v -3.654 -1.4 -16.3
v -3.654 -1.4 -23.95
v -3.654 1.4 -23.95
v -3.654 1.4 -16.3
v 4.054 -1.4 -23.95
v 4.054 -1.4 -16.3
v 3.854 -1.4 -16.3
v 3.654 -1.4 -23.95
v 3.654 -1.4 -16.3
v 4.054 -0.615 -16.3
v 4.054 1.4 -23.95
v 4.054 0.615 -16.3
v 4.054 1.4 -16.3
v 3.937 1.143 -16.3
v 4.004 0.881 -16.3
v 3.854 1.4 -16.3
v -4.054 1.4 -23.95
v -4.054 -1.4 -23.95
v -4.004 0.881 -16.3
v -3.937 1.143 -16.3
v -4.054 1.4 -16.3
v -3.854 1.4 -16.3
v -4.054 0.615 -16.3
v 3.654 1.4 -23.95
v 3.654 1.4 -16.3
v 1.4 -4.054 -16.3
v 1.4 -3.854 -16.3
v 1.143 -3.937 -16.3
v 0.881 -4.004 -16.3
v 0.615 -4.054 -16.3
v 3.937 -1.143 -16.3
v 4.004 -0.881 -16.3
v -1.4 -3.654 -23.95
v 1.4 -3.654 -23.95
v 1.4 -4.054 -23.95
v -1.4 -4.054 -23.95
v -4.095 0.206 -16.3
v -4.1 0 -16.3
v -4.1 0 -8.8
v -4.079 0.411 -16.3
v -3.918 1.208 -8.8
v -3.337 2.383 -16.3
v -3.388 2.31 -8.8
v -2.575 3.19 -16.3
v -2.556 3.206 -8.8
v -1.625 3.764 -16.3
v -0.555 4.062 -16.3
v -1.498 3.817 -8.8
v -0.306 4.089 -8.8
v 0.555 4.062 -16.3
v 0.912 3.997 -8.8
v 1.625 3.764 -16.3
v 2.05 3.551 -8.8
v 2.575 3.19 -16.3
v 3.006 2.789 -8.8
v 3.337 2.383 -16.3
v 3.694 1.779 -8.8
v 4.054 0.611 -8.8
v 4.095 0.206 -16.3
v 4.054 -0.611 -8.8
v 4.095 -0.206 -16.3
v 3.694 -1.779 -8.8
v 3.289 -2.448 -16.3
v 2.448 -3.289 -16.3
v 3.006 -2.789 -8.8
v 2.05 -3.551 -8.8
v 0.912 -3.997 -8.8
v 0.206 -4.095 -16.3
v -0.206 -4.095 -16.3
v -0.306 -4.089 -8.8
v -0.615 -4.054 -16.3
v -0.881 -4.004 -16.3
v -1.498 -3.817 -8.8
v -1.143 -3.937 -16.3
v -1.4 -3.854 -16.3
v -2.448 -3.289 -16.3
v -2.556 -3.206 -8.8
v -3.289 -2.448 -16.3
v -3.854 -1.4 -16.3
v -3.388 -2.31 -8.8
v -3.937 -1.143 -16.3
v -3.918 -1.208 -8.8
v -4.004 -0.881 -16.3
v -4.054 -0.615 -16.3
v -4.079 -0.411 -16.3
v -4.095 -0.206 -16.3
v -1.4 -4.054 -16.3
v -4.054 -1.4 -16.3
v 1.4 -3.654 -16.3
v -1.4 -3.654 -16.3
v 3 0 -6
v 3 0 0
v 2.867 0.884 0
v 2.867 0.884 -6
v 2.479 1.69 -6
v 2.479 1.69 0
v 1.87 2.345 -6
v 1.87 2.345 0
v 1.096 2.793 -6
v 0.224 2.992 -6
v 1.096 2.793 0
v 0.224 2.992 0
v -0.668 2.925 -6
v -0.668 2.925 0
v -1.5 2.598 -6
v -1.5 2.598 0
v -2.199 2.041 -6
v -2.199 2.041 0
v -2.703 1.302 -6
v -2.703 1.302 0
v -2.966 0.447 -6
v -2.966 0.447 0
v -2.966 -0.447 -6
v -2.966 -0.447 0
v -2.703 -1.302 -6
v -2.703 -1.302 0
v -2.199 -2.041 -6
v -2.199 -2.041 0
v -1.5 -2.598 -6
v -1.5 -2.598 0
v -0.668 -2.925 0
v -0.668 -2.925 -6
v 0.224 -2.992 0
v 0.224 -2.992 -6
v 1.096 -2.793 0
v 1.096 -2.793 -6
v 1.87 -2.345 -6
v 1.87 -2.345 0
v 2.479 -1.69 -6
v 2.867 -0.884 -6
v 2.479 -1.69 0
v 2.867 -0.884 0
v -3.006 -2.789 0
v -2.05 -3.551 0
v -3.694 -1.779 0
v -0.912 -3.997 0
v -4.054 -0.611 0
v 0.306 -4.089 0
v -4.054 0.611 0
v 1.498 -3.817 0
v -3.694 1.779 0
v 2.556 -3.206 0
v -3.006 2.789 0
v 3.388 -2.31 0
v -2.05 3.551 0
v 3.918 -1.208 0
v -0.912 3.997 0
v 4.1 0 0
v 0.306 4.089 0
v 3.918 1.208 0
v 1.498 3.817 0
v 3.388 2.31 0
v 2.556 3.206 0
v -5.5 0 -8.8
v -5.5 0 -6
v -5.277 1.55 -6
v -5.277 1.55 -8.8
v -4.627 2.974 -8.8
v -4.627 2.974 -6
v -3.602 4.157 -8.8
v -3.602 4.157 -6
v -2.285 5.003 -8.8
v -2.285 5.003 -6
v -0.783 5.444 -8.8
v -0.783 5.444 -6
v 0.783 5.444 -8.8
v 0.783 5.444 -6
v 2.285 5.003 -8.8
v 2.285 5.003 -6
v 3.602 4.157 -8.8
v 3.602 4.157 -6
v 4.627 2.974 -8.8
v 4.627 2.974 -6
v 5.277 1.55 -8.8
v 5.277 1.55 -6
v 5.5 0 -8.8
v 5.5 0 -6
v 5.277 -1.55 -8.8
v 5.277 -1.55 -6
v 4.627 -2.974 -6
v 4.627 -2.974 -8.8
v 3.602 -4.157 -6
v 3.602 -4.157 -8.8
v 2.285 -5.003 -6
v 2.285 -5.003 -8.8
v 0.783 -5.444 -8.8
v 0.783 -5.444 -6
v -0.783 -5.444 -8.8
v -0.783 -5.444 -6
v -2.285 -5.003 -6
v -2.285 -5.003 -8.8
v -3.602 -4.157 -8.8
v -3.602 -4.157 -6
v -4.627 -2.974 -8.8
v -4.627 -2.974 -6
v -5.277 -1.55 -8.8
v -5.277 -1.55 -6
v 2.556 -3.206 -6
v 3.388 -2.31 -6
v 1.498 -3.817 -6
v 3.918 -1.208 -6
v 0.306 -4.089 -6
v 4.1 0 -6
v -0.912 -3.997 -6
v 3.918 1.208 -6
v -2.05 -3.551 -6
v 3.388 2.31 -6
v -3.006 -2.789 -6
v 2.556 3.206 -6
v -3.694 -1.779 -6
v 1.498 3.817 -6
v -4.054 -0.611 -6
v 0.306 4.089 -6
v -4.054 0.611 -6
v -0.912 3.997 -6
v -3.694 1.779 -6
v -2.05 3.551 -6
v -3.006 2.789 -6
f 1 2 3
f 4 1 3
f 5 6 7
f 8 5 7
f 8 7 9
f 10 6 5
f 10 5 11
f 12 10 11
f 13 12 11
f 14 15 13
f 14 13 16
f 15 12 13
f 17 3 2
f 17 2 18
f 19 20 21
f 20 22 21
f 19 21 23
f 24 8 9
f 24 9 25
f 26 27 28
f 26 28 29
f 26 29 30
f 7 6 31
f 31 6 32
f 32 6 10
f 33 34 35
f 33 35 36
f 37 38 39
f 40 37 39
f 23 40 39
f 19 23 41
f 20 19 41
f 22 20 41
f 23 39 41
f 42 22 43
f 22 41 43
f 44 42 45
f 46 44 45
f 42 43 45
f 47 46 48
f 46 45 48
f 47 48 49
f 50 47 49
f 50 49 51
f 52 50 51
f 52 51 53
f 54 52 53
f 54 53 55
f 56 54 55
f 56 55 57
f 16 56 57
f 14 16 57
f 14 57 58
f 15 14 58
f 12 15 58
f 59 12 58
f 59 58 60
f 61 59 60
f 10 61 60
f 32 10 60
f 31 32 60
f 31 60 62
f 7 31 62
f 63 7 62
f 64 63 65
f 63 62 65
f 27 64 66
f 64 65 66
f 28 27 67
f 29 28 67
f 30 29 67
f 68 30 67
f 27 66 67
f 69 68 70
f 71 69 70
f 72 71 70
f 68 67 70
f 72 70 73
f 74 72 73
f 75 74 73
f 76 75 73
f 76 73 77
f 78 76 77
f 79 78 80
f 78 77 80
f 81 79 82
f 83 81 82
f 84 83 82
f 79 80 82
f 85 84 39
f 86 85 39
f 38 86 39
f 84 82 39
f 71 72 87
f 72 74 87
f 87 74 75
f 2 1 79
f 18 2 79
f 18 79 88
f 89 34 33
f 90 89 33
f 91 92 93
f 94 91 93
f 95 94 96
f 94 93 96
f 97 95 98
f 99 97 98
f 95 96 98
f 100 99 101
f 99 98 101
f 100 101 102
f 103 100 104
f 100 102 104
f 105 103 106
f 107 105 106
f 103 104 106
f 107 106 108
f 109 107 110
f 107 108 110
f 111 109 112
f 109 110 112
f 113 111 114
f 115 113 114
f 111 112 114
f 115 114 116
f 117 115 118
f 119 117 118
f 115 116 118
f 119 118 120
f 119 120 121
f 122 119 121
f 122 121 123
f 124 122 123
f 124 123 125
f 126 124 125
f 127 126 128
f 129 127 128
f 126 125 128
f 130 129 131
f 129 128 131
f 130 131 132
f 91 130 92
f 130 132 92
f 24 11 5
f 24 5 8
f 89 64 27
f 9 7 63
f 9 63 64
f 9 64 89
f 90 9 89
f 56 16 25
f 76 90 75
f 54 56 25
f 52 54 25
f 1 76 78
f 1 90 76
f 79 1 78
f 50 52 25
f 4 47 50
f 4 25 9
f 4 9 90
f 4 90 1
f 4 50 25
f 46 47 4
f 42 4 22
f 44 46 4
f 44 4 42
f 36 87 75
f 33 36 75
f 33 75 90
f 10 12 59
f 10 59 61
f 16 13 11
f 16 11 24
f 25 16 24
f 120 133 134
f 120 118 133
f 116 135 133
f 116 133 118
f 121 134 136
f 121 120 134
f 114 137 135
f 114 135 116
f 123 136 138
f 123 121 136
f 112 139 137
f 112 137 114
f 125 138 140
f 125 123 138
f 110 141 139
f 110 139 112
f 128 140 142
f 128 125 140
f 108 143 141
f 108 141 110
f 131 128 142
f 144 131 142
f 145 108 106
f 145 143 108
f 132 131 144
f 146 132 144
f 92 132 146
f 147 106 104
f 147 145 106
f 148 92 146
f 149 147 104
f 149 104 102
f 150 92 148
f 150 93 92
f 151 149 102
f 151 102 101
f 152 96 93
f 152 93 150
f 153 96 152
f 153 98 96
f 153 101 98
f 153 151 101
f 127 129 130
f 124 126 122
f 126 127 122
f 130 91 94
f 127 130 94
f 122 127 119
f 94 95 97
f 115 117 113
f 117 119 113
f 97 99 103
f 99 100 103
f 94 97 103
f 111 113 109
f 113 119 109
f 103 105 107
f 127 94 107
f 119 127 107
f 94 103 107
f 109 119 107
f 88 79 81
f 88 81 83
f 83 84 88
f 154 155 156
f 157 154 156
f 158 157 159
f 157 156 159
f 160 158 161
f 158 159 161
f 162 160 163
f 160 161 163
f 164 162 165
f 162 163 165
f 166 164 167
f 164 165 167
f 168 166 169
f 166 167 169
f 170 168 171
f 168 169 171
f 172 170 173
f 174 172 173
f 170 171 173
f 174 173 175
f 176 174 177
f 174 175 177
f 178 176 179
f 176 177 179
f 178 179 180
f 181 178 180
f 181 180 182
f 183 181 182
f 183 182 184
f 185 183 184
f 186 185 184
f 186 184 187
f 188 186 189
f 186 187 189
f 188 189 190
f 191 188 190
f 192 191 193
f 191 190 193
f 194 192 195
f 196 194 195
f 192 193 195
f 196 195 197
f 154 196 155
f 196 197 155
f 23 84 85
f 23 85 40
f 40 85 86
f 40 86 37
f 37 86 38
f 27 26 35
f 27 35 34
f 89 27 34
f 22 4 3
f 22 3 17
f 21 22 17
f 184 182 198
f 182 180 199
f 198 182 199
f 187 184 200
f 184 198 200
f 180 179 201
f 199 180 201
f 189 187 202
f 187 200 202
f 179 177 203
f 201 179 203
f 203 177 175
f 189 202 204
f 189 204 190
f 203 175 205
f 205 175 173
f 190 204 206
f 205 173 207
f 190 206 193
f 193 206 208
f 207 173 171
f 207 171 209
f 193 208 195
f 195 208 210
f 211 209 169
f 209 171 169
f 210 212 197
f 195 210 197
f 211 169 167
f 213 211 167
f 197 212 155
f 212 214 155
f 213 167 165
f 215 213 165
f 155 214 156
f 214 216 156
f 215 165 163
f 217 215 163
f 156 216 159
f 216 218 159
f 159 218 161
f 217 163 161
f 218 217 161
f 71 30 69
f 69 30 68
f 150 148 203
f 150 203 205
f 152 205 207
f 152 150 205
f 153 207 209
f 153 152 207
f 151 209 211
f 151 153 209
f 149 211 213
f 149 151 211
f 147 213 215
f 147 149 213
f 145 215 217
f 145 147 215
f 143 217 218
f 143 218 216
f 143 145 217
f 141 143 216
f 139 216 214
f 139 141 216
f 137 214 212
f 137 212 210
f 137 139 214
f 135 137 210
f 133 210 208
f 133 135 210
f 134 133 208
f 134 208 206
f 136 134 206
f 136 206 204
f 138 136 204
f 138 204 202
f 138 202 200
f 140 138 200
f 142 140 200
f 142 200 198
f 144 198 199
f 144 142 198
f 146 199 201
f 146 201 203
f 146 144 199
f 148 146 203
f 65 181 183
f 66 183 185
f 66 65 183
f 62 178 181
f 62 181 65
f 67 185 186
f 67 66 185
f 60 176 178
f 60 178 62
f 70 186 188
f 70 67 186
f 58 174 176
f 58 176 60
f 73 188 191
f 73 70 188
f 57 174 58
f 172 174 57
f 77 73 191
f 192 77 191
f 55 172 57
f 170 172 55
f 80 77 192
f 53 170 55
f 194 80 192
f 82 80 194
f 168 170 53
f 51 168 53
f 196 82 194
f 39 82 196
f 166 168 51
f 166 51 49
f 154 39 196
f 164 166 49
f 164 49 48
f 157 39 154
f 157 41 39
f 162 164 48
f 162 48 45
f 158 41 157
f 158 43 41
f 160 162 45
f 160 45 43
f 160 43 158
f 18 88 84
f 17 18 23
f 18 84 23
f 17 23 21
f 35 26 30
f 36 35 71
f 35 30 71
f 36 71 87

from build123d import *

# Parameters (mm, degrees)
SKETCH1_R           = 4.1
SKETCH1_R_2         = 3
BOSS_EXTRUDE1_DEPTH = 6
SKETCH2_R           = 5.5
BOSS_EXTRUDE2_DEPTH = 2.8
SKETCH3_R           = 4.1
BOSS_EXTRUDE3_DEPTH = 7.5
SKETCH4_W           = 0.4
SKETCH4_H           = 2.8
SKETCH4_W_2         = 2.8
SKETCH4_H_2         = 0.4
EXTRUDE_THIN1_DEPTH = 7.65


with BuildPart() as part:
    # Sketch1 → Boss-Extrude1 (new body)
    with BuildSketch(Plane.XY):
        Circle(SKETCH1_R)
        Circle(SKETCH1_R_2, mode=Mode.SUBTRACT)
    extrude(amount=-BOSS_EXTRUDE1_DEPTH)

    # Sketch2 → Boss-Extrude2 (add)
    with BuildSketch(Plane(origin=(0, 0, -6), x_dir=(-1, 0, 0), z_dir=(0, 0, -1))):
        Circle(SKETCH2_R)
    extrude(amount=BOSS_EXTRUDE2_DEPTH)

    # Sketch3 → Boss-Extrude3 (add)
    with BuildSketch(Plane(origin=(0, 0, -8.8), x_dir=(-1, 0, 0), z_dir=(0, 0, -1))):
        Circle(SKETCH3_R)
    extrude(amount=BOSS_EXTRUDE3_DEPTH)

    # Sketch4 → Extrude-Thin1 (add)
    with BuildSketch(Plane(origin=(0, 0, -16.3), x_dir=(-1, 0, 0), z_dir=(0, 0, -1))):
        with Locations((-3.853569774, 0)):
            Rectangle(SKETCH4_W, SKETCH4_H)
        with Locations((0, -3.853569774)):
            Rectangle(SKETCH4_W_2, SKETCH4_H_2)
        with Locations((3.853569774, 0)):
            Rectangle(SKETCH4_W, SKETCH4_H)
    extrude(amount=EXTRUDE_THIN1_DEPTH)


solid = part.part
